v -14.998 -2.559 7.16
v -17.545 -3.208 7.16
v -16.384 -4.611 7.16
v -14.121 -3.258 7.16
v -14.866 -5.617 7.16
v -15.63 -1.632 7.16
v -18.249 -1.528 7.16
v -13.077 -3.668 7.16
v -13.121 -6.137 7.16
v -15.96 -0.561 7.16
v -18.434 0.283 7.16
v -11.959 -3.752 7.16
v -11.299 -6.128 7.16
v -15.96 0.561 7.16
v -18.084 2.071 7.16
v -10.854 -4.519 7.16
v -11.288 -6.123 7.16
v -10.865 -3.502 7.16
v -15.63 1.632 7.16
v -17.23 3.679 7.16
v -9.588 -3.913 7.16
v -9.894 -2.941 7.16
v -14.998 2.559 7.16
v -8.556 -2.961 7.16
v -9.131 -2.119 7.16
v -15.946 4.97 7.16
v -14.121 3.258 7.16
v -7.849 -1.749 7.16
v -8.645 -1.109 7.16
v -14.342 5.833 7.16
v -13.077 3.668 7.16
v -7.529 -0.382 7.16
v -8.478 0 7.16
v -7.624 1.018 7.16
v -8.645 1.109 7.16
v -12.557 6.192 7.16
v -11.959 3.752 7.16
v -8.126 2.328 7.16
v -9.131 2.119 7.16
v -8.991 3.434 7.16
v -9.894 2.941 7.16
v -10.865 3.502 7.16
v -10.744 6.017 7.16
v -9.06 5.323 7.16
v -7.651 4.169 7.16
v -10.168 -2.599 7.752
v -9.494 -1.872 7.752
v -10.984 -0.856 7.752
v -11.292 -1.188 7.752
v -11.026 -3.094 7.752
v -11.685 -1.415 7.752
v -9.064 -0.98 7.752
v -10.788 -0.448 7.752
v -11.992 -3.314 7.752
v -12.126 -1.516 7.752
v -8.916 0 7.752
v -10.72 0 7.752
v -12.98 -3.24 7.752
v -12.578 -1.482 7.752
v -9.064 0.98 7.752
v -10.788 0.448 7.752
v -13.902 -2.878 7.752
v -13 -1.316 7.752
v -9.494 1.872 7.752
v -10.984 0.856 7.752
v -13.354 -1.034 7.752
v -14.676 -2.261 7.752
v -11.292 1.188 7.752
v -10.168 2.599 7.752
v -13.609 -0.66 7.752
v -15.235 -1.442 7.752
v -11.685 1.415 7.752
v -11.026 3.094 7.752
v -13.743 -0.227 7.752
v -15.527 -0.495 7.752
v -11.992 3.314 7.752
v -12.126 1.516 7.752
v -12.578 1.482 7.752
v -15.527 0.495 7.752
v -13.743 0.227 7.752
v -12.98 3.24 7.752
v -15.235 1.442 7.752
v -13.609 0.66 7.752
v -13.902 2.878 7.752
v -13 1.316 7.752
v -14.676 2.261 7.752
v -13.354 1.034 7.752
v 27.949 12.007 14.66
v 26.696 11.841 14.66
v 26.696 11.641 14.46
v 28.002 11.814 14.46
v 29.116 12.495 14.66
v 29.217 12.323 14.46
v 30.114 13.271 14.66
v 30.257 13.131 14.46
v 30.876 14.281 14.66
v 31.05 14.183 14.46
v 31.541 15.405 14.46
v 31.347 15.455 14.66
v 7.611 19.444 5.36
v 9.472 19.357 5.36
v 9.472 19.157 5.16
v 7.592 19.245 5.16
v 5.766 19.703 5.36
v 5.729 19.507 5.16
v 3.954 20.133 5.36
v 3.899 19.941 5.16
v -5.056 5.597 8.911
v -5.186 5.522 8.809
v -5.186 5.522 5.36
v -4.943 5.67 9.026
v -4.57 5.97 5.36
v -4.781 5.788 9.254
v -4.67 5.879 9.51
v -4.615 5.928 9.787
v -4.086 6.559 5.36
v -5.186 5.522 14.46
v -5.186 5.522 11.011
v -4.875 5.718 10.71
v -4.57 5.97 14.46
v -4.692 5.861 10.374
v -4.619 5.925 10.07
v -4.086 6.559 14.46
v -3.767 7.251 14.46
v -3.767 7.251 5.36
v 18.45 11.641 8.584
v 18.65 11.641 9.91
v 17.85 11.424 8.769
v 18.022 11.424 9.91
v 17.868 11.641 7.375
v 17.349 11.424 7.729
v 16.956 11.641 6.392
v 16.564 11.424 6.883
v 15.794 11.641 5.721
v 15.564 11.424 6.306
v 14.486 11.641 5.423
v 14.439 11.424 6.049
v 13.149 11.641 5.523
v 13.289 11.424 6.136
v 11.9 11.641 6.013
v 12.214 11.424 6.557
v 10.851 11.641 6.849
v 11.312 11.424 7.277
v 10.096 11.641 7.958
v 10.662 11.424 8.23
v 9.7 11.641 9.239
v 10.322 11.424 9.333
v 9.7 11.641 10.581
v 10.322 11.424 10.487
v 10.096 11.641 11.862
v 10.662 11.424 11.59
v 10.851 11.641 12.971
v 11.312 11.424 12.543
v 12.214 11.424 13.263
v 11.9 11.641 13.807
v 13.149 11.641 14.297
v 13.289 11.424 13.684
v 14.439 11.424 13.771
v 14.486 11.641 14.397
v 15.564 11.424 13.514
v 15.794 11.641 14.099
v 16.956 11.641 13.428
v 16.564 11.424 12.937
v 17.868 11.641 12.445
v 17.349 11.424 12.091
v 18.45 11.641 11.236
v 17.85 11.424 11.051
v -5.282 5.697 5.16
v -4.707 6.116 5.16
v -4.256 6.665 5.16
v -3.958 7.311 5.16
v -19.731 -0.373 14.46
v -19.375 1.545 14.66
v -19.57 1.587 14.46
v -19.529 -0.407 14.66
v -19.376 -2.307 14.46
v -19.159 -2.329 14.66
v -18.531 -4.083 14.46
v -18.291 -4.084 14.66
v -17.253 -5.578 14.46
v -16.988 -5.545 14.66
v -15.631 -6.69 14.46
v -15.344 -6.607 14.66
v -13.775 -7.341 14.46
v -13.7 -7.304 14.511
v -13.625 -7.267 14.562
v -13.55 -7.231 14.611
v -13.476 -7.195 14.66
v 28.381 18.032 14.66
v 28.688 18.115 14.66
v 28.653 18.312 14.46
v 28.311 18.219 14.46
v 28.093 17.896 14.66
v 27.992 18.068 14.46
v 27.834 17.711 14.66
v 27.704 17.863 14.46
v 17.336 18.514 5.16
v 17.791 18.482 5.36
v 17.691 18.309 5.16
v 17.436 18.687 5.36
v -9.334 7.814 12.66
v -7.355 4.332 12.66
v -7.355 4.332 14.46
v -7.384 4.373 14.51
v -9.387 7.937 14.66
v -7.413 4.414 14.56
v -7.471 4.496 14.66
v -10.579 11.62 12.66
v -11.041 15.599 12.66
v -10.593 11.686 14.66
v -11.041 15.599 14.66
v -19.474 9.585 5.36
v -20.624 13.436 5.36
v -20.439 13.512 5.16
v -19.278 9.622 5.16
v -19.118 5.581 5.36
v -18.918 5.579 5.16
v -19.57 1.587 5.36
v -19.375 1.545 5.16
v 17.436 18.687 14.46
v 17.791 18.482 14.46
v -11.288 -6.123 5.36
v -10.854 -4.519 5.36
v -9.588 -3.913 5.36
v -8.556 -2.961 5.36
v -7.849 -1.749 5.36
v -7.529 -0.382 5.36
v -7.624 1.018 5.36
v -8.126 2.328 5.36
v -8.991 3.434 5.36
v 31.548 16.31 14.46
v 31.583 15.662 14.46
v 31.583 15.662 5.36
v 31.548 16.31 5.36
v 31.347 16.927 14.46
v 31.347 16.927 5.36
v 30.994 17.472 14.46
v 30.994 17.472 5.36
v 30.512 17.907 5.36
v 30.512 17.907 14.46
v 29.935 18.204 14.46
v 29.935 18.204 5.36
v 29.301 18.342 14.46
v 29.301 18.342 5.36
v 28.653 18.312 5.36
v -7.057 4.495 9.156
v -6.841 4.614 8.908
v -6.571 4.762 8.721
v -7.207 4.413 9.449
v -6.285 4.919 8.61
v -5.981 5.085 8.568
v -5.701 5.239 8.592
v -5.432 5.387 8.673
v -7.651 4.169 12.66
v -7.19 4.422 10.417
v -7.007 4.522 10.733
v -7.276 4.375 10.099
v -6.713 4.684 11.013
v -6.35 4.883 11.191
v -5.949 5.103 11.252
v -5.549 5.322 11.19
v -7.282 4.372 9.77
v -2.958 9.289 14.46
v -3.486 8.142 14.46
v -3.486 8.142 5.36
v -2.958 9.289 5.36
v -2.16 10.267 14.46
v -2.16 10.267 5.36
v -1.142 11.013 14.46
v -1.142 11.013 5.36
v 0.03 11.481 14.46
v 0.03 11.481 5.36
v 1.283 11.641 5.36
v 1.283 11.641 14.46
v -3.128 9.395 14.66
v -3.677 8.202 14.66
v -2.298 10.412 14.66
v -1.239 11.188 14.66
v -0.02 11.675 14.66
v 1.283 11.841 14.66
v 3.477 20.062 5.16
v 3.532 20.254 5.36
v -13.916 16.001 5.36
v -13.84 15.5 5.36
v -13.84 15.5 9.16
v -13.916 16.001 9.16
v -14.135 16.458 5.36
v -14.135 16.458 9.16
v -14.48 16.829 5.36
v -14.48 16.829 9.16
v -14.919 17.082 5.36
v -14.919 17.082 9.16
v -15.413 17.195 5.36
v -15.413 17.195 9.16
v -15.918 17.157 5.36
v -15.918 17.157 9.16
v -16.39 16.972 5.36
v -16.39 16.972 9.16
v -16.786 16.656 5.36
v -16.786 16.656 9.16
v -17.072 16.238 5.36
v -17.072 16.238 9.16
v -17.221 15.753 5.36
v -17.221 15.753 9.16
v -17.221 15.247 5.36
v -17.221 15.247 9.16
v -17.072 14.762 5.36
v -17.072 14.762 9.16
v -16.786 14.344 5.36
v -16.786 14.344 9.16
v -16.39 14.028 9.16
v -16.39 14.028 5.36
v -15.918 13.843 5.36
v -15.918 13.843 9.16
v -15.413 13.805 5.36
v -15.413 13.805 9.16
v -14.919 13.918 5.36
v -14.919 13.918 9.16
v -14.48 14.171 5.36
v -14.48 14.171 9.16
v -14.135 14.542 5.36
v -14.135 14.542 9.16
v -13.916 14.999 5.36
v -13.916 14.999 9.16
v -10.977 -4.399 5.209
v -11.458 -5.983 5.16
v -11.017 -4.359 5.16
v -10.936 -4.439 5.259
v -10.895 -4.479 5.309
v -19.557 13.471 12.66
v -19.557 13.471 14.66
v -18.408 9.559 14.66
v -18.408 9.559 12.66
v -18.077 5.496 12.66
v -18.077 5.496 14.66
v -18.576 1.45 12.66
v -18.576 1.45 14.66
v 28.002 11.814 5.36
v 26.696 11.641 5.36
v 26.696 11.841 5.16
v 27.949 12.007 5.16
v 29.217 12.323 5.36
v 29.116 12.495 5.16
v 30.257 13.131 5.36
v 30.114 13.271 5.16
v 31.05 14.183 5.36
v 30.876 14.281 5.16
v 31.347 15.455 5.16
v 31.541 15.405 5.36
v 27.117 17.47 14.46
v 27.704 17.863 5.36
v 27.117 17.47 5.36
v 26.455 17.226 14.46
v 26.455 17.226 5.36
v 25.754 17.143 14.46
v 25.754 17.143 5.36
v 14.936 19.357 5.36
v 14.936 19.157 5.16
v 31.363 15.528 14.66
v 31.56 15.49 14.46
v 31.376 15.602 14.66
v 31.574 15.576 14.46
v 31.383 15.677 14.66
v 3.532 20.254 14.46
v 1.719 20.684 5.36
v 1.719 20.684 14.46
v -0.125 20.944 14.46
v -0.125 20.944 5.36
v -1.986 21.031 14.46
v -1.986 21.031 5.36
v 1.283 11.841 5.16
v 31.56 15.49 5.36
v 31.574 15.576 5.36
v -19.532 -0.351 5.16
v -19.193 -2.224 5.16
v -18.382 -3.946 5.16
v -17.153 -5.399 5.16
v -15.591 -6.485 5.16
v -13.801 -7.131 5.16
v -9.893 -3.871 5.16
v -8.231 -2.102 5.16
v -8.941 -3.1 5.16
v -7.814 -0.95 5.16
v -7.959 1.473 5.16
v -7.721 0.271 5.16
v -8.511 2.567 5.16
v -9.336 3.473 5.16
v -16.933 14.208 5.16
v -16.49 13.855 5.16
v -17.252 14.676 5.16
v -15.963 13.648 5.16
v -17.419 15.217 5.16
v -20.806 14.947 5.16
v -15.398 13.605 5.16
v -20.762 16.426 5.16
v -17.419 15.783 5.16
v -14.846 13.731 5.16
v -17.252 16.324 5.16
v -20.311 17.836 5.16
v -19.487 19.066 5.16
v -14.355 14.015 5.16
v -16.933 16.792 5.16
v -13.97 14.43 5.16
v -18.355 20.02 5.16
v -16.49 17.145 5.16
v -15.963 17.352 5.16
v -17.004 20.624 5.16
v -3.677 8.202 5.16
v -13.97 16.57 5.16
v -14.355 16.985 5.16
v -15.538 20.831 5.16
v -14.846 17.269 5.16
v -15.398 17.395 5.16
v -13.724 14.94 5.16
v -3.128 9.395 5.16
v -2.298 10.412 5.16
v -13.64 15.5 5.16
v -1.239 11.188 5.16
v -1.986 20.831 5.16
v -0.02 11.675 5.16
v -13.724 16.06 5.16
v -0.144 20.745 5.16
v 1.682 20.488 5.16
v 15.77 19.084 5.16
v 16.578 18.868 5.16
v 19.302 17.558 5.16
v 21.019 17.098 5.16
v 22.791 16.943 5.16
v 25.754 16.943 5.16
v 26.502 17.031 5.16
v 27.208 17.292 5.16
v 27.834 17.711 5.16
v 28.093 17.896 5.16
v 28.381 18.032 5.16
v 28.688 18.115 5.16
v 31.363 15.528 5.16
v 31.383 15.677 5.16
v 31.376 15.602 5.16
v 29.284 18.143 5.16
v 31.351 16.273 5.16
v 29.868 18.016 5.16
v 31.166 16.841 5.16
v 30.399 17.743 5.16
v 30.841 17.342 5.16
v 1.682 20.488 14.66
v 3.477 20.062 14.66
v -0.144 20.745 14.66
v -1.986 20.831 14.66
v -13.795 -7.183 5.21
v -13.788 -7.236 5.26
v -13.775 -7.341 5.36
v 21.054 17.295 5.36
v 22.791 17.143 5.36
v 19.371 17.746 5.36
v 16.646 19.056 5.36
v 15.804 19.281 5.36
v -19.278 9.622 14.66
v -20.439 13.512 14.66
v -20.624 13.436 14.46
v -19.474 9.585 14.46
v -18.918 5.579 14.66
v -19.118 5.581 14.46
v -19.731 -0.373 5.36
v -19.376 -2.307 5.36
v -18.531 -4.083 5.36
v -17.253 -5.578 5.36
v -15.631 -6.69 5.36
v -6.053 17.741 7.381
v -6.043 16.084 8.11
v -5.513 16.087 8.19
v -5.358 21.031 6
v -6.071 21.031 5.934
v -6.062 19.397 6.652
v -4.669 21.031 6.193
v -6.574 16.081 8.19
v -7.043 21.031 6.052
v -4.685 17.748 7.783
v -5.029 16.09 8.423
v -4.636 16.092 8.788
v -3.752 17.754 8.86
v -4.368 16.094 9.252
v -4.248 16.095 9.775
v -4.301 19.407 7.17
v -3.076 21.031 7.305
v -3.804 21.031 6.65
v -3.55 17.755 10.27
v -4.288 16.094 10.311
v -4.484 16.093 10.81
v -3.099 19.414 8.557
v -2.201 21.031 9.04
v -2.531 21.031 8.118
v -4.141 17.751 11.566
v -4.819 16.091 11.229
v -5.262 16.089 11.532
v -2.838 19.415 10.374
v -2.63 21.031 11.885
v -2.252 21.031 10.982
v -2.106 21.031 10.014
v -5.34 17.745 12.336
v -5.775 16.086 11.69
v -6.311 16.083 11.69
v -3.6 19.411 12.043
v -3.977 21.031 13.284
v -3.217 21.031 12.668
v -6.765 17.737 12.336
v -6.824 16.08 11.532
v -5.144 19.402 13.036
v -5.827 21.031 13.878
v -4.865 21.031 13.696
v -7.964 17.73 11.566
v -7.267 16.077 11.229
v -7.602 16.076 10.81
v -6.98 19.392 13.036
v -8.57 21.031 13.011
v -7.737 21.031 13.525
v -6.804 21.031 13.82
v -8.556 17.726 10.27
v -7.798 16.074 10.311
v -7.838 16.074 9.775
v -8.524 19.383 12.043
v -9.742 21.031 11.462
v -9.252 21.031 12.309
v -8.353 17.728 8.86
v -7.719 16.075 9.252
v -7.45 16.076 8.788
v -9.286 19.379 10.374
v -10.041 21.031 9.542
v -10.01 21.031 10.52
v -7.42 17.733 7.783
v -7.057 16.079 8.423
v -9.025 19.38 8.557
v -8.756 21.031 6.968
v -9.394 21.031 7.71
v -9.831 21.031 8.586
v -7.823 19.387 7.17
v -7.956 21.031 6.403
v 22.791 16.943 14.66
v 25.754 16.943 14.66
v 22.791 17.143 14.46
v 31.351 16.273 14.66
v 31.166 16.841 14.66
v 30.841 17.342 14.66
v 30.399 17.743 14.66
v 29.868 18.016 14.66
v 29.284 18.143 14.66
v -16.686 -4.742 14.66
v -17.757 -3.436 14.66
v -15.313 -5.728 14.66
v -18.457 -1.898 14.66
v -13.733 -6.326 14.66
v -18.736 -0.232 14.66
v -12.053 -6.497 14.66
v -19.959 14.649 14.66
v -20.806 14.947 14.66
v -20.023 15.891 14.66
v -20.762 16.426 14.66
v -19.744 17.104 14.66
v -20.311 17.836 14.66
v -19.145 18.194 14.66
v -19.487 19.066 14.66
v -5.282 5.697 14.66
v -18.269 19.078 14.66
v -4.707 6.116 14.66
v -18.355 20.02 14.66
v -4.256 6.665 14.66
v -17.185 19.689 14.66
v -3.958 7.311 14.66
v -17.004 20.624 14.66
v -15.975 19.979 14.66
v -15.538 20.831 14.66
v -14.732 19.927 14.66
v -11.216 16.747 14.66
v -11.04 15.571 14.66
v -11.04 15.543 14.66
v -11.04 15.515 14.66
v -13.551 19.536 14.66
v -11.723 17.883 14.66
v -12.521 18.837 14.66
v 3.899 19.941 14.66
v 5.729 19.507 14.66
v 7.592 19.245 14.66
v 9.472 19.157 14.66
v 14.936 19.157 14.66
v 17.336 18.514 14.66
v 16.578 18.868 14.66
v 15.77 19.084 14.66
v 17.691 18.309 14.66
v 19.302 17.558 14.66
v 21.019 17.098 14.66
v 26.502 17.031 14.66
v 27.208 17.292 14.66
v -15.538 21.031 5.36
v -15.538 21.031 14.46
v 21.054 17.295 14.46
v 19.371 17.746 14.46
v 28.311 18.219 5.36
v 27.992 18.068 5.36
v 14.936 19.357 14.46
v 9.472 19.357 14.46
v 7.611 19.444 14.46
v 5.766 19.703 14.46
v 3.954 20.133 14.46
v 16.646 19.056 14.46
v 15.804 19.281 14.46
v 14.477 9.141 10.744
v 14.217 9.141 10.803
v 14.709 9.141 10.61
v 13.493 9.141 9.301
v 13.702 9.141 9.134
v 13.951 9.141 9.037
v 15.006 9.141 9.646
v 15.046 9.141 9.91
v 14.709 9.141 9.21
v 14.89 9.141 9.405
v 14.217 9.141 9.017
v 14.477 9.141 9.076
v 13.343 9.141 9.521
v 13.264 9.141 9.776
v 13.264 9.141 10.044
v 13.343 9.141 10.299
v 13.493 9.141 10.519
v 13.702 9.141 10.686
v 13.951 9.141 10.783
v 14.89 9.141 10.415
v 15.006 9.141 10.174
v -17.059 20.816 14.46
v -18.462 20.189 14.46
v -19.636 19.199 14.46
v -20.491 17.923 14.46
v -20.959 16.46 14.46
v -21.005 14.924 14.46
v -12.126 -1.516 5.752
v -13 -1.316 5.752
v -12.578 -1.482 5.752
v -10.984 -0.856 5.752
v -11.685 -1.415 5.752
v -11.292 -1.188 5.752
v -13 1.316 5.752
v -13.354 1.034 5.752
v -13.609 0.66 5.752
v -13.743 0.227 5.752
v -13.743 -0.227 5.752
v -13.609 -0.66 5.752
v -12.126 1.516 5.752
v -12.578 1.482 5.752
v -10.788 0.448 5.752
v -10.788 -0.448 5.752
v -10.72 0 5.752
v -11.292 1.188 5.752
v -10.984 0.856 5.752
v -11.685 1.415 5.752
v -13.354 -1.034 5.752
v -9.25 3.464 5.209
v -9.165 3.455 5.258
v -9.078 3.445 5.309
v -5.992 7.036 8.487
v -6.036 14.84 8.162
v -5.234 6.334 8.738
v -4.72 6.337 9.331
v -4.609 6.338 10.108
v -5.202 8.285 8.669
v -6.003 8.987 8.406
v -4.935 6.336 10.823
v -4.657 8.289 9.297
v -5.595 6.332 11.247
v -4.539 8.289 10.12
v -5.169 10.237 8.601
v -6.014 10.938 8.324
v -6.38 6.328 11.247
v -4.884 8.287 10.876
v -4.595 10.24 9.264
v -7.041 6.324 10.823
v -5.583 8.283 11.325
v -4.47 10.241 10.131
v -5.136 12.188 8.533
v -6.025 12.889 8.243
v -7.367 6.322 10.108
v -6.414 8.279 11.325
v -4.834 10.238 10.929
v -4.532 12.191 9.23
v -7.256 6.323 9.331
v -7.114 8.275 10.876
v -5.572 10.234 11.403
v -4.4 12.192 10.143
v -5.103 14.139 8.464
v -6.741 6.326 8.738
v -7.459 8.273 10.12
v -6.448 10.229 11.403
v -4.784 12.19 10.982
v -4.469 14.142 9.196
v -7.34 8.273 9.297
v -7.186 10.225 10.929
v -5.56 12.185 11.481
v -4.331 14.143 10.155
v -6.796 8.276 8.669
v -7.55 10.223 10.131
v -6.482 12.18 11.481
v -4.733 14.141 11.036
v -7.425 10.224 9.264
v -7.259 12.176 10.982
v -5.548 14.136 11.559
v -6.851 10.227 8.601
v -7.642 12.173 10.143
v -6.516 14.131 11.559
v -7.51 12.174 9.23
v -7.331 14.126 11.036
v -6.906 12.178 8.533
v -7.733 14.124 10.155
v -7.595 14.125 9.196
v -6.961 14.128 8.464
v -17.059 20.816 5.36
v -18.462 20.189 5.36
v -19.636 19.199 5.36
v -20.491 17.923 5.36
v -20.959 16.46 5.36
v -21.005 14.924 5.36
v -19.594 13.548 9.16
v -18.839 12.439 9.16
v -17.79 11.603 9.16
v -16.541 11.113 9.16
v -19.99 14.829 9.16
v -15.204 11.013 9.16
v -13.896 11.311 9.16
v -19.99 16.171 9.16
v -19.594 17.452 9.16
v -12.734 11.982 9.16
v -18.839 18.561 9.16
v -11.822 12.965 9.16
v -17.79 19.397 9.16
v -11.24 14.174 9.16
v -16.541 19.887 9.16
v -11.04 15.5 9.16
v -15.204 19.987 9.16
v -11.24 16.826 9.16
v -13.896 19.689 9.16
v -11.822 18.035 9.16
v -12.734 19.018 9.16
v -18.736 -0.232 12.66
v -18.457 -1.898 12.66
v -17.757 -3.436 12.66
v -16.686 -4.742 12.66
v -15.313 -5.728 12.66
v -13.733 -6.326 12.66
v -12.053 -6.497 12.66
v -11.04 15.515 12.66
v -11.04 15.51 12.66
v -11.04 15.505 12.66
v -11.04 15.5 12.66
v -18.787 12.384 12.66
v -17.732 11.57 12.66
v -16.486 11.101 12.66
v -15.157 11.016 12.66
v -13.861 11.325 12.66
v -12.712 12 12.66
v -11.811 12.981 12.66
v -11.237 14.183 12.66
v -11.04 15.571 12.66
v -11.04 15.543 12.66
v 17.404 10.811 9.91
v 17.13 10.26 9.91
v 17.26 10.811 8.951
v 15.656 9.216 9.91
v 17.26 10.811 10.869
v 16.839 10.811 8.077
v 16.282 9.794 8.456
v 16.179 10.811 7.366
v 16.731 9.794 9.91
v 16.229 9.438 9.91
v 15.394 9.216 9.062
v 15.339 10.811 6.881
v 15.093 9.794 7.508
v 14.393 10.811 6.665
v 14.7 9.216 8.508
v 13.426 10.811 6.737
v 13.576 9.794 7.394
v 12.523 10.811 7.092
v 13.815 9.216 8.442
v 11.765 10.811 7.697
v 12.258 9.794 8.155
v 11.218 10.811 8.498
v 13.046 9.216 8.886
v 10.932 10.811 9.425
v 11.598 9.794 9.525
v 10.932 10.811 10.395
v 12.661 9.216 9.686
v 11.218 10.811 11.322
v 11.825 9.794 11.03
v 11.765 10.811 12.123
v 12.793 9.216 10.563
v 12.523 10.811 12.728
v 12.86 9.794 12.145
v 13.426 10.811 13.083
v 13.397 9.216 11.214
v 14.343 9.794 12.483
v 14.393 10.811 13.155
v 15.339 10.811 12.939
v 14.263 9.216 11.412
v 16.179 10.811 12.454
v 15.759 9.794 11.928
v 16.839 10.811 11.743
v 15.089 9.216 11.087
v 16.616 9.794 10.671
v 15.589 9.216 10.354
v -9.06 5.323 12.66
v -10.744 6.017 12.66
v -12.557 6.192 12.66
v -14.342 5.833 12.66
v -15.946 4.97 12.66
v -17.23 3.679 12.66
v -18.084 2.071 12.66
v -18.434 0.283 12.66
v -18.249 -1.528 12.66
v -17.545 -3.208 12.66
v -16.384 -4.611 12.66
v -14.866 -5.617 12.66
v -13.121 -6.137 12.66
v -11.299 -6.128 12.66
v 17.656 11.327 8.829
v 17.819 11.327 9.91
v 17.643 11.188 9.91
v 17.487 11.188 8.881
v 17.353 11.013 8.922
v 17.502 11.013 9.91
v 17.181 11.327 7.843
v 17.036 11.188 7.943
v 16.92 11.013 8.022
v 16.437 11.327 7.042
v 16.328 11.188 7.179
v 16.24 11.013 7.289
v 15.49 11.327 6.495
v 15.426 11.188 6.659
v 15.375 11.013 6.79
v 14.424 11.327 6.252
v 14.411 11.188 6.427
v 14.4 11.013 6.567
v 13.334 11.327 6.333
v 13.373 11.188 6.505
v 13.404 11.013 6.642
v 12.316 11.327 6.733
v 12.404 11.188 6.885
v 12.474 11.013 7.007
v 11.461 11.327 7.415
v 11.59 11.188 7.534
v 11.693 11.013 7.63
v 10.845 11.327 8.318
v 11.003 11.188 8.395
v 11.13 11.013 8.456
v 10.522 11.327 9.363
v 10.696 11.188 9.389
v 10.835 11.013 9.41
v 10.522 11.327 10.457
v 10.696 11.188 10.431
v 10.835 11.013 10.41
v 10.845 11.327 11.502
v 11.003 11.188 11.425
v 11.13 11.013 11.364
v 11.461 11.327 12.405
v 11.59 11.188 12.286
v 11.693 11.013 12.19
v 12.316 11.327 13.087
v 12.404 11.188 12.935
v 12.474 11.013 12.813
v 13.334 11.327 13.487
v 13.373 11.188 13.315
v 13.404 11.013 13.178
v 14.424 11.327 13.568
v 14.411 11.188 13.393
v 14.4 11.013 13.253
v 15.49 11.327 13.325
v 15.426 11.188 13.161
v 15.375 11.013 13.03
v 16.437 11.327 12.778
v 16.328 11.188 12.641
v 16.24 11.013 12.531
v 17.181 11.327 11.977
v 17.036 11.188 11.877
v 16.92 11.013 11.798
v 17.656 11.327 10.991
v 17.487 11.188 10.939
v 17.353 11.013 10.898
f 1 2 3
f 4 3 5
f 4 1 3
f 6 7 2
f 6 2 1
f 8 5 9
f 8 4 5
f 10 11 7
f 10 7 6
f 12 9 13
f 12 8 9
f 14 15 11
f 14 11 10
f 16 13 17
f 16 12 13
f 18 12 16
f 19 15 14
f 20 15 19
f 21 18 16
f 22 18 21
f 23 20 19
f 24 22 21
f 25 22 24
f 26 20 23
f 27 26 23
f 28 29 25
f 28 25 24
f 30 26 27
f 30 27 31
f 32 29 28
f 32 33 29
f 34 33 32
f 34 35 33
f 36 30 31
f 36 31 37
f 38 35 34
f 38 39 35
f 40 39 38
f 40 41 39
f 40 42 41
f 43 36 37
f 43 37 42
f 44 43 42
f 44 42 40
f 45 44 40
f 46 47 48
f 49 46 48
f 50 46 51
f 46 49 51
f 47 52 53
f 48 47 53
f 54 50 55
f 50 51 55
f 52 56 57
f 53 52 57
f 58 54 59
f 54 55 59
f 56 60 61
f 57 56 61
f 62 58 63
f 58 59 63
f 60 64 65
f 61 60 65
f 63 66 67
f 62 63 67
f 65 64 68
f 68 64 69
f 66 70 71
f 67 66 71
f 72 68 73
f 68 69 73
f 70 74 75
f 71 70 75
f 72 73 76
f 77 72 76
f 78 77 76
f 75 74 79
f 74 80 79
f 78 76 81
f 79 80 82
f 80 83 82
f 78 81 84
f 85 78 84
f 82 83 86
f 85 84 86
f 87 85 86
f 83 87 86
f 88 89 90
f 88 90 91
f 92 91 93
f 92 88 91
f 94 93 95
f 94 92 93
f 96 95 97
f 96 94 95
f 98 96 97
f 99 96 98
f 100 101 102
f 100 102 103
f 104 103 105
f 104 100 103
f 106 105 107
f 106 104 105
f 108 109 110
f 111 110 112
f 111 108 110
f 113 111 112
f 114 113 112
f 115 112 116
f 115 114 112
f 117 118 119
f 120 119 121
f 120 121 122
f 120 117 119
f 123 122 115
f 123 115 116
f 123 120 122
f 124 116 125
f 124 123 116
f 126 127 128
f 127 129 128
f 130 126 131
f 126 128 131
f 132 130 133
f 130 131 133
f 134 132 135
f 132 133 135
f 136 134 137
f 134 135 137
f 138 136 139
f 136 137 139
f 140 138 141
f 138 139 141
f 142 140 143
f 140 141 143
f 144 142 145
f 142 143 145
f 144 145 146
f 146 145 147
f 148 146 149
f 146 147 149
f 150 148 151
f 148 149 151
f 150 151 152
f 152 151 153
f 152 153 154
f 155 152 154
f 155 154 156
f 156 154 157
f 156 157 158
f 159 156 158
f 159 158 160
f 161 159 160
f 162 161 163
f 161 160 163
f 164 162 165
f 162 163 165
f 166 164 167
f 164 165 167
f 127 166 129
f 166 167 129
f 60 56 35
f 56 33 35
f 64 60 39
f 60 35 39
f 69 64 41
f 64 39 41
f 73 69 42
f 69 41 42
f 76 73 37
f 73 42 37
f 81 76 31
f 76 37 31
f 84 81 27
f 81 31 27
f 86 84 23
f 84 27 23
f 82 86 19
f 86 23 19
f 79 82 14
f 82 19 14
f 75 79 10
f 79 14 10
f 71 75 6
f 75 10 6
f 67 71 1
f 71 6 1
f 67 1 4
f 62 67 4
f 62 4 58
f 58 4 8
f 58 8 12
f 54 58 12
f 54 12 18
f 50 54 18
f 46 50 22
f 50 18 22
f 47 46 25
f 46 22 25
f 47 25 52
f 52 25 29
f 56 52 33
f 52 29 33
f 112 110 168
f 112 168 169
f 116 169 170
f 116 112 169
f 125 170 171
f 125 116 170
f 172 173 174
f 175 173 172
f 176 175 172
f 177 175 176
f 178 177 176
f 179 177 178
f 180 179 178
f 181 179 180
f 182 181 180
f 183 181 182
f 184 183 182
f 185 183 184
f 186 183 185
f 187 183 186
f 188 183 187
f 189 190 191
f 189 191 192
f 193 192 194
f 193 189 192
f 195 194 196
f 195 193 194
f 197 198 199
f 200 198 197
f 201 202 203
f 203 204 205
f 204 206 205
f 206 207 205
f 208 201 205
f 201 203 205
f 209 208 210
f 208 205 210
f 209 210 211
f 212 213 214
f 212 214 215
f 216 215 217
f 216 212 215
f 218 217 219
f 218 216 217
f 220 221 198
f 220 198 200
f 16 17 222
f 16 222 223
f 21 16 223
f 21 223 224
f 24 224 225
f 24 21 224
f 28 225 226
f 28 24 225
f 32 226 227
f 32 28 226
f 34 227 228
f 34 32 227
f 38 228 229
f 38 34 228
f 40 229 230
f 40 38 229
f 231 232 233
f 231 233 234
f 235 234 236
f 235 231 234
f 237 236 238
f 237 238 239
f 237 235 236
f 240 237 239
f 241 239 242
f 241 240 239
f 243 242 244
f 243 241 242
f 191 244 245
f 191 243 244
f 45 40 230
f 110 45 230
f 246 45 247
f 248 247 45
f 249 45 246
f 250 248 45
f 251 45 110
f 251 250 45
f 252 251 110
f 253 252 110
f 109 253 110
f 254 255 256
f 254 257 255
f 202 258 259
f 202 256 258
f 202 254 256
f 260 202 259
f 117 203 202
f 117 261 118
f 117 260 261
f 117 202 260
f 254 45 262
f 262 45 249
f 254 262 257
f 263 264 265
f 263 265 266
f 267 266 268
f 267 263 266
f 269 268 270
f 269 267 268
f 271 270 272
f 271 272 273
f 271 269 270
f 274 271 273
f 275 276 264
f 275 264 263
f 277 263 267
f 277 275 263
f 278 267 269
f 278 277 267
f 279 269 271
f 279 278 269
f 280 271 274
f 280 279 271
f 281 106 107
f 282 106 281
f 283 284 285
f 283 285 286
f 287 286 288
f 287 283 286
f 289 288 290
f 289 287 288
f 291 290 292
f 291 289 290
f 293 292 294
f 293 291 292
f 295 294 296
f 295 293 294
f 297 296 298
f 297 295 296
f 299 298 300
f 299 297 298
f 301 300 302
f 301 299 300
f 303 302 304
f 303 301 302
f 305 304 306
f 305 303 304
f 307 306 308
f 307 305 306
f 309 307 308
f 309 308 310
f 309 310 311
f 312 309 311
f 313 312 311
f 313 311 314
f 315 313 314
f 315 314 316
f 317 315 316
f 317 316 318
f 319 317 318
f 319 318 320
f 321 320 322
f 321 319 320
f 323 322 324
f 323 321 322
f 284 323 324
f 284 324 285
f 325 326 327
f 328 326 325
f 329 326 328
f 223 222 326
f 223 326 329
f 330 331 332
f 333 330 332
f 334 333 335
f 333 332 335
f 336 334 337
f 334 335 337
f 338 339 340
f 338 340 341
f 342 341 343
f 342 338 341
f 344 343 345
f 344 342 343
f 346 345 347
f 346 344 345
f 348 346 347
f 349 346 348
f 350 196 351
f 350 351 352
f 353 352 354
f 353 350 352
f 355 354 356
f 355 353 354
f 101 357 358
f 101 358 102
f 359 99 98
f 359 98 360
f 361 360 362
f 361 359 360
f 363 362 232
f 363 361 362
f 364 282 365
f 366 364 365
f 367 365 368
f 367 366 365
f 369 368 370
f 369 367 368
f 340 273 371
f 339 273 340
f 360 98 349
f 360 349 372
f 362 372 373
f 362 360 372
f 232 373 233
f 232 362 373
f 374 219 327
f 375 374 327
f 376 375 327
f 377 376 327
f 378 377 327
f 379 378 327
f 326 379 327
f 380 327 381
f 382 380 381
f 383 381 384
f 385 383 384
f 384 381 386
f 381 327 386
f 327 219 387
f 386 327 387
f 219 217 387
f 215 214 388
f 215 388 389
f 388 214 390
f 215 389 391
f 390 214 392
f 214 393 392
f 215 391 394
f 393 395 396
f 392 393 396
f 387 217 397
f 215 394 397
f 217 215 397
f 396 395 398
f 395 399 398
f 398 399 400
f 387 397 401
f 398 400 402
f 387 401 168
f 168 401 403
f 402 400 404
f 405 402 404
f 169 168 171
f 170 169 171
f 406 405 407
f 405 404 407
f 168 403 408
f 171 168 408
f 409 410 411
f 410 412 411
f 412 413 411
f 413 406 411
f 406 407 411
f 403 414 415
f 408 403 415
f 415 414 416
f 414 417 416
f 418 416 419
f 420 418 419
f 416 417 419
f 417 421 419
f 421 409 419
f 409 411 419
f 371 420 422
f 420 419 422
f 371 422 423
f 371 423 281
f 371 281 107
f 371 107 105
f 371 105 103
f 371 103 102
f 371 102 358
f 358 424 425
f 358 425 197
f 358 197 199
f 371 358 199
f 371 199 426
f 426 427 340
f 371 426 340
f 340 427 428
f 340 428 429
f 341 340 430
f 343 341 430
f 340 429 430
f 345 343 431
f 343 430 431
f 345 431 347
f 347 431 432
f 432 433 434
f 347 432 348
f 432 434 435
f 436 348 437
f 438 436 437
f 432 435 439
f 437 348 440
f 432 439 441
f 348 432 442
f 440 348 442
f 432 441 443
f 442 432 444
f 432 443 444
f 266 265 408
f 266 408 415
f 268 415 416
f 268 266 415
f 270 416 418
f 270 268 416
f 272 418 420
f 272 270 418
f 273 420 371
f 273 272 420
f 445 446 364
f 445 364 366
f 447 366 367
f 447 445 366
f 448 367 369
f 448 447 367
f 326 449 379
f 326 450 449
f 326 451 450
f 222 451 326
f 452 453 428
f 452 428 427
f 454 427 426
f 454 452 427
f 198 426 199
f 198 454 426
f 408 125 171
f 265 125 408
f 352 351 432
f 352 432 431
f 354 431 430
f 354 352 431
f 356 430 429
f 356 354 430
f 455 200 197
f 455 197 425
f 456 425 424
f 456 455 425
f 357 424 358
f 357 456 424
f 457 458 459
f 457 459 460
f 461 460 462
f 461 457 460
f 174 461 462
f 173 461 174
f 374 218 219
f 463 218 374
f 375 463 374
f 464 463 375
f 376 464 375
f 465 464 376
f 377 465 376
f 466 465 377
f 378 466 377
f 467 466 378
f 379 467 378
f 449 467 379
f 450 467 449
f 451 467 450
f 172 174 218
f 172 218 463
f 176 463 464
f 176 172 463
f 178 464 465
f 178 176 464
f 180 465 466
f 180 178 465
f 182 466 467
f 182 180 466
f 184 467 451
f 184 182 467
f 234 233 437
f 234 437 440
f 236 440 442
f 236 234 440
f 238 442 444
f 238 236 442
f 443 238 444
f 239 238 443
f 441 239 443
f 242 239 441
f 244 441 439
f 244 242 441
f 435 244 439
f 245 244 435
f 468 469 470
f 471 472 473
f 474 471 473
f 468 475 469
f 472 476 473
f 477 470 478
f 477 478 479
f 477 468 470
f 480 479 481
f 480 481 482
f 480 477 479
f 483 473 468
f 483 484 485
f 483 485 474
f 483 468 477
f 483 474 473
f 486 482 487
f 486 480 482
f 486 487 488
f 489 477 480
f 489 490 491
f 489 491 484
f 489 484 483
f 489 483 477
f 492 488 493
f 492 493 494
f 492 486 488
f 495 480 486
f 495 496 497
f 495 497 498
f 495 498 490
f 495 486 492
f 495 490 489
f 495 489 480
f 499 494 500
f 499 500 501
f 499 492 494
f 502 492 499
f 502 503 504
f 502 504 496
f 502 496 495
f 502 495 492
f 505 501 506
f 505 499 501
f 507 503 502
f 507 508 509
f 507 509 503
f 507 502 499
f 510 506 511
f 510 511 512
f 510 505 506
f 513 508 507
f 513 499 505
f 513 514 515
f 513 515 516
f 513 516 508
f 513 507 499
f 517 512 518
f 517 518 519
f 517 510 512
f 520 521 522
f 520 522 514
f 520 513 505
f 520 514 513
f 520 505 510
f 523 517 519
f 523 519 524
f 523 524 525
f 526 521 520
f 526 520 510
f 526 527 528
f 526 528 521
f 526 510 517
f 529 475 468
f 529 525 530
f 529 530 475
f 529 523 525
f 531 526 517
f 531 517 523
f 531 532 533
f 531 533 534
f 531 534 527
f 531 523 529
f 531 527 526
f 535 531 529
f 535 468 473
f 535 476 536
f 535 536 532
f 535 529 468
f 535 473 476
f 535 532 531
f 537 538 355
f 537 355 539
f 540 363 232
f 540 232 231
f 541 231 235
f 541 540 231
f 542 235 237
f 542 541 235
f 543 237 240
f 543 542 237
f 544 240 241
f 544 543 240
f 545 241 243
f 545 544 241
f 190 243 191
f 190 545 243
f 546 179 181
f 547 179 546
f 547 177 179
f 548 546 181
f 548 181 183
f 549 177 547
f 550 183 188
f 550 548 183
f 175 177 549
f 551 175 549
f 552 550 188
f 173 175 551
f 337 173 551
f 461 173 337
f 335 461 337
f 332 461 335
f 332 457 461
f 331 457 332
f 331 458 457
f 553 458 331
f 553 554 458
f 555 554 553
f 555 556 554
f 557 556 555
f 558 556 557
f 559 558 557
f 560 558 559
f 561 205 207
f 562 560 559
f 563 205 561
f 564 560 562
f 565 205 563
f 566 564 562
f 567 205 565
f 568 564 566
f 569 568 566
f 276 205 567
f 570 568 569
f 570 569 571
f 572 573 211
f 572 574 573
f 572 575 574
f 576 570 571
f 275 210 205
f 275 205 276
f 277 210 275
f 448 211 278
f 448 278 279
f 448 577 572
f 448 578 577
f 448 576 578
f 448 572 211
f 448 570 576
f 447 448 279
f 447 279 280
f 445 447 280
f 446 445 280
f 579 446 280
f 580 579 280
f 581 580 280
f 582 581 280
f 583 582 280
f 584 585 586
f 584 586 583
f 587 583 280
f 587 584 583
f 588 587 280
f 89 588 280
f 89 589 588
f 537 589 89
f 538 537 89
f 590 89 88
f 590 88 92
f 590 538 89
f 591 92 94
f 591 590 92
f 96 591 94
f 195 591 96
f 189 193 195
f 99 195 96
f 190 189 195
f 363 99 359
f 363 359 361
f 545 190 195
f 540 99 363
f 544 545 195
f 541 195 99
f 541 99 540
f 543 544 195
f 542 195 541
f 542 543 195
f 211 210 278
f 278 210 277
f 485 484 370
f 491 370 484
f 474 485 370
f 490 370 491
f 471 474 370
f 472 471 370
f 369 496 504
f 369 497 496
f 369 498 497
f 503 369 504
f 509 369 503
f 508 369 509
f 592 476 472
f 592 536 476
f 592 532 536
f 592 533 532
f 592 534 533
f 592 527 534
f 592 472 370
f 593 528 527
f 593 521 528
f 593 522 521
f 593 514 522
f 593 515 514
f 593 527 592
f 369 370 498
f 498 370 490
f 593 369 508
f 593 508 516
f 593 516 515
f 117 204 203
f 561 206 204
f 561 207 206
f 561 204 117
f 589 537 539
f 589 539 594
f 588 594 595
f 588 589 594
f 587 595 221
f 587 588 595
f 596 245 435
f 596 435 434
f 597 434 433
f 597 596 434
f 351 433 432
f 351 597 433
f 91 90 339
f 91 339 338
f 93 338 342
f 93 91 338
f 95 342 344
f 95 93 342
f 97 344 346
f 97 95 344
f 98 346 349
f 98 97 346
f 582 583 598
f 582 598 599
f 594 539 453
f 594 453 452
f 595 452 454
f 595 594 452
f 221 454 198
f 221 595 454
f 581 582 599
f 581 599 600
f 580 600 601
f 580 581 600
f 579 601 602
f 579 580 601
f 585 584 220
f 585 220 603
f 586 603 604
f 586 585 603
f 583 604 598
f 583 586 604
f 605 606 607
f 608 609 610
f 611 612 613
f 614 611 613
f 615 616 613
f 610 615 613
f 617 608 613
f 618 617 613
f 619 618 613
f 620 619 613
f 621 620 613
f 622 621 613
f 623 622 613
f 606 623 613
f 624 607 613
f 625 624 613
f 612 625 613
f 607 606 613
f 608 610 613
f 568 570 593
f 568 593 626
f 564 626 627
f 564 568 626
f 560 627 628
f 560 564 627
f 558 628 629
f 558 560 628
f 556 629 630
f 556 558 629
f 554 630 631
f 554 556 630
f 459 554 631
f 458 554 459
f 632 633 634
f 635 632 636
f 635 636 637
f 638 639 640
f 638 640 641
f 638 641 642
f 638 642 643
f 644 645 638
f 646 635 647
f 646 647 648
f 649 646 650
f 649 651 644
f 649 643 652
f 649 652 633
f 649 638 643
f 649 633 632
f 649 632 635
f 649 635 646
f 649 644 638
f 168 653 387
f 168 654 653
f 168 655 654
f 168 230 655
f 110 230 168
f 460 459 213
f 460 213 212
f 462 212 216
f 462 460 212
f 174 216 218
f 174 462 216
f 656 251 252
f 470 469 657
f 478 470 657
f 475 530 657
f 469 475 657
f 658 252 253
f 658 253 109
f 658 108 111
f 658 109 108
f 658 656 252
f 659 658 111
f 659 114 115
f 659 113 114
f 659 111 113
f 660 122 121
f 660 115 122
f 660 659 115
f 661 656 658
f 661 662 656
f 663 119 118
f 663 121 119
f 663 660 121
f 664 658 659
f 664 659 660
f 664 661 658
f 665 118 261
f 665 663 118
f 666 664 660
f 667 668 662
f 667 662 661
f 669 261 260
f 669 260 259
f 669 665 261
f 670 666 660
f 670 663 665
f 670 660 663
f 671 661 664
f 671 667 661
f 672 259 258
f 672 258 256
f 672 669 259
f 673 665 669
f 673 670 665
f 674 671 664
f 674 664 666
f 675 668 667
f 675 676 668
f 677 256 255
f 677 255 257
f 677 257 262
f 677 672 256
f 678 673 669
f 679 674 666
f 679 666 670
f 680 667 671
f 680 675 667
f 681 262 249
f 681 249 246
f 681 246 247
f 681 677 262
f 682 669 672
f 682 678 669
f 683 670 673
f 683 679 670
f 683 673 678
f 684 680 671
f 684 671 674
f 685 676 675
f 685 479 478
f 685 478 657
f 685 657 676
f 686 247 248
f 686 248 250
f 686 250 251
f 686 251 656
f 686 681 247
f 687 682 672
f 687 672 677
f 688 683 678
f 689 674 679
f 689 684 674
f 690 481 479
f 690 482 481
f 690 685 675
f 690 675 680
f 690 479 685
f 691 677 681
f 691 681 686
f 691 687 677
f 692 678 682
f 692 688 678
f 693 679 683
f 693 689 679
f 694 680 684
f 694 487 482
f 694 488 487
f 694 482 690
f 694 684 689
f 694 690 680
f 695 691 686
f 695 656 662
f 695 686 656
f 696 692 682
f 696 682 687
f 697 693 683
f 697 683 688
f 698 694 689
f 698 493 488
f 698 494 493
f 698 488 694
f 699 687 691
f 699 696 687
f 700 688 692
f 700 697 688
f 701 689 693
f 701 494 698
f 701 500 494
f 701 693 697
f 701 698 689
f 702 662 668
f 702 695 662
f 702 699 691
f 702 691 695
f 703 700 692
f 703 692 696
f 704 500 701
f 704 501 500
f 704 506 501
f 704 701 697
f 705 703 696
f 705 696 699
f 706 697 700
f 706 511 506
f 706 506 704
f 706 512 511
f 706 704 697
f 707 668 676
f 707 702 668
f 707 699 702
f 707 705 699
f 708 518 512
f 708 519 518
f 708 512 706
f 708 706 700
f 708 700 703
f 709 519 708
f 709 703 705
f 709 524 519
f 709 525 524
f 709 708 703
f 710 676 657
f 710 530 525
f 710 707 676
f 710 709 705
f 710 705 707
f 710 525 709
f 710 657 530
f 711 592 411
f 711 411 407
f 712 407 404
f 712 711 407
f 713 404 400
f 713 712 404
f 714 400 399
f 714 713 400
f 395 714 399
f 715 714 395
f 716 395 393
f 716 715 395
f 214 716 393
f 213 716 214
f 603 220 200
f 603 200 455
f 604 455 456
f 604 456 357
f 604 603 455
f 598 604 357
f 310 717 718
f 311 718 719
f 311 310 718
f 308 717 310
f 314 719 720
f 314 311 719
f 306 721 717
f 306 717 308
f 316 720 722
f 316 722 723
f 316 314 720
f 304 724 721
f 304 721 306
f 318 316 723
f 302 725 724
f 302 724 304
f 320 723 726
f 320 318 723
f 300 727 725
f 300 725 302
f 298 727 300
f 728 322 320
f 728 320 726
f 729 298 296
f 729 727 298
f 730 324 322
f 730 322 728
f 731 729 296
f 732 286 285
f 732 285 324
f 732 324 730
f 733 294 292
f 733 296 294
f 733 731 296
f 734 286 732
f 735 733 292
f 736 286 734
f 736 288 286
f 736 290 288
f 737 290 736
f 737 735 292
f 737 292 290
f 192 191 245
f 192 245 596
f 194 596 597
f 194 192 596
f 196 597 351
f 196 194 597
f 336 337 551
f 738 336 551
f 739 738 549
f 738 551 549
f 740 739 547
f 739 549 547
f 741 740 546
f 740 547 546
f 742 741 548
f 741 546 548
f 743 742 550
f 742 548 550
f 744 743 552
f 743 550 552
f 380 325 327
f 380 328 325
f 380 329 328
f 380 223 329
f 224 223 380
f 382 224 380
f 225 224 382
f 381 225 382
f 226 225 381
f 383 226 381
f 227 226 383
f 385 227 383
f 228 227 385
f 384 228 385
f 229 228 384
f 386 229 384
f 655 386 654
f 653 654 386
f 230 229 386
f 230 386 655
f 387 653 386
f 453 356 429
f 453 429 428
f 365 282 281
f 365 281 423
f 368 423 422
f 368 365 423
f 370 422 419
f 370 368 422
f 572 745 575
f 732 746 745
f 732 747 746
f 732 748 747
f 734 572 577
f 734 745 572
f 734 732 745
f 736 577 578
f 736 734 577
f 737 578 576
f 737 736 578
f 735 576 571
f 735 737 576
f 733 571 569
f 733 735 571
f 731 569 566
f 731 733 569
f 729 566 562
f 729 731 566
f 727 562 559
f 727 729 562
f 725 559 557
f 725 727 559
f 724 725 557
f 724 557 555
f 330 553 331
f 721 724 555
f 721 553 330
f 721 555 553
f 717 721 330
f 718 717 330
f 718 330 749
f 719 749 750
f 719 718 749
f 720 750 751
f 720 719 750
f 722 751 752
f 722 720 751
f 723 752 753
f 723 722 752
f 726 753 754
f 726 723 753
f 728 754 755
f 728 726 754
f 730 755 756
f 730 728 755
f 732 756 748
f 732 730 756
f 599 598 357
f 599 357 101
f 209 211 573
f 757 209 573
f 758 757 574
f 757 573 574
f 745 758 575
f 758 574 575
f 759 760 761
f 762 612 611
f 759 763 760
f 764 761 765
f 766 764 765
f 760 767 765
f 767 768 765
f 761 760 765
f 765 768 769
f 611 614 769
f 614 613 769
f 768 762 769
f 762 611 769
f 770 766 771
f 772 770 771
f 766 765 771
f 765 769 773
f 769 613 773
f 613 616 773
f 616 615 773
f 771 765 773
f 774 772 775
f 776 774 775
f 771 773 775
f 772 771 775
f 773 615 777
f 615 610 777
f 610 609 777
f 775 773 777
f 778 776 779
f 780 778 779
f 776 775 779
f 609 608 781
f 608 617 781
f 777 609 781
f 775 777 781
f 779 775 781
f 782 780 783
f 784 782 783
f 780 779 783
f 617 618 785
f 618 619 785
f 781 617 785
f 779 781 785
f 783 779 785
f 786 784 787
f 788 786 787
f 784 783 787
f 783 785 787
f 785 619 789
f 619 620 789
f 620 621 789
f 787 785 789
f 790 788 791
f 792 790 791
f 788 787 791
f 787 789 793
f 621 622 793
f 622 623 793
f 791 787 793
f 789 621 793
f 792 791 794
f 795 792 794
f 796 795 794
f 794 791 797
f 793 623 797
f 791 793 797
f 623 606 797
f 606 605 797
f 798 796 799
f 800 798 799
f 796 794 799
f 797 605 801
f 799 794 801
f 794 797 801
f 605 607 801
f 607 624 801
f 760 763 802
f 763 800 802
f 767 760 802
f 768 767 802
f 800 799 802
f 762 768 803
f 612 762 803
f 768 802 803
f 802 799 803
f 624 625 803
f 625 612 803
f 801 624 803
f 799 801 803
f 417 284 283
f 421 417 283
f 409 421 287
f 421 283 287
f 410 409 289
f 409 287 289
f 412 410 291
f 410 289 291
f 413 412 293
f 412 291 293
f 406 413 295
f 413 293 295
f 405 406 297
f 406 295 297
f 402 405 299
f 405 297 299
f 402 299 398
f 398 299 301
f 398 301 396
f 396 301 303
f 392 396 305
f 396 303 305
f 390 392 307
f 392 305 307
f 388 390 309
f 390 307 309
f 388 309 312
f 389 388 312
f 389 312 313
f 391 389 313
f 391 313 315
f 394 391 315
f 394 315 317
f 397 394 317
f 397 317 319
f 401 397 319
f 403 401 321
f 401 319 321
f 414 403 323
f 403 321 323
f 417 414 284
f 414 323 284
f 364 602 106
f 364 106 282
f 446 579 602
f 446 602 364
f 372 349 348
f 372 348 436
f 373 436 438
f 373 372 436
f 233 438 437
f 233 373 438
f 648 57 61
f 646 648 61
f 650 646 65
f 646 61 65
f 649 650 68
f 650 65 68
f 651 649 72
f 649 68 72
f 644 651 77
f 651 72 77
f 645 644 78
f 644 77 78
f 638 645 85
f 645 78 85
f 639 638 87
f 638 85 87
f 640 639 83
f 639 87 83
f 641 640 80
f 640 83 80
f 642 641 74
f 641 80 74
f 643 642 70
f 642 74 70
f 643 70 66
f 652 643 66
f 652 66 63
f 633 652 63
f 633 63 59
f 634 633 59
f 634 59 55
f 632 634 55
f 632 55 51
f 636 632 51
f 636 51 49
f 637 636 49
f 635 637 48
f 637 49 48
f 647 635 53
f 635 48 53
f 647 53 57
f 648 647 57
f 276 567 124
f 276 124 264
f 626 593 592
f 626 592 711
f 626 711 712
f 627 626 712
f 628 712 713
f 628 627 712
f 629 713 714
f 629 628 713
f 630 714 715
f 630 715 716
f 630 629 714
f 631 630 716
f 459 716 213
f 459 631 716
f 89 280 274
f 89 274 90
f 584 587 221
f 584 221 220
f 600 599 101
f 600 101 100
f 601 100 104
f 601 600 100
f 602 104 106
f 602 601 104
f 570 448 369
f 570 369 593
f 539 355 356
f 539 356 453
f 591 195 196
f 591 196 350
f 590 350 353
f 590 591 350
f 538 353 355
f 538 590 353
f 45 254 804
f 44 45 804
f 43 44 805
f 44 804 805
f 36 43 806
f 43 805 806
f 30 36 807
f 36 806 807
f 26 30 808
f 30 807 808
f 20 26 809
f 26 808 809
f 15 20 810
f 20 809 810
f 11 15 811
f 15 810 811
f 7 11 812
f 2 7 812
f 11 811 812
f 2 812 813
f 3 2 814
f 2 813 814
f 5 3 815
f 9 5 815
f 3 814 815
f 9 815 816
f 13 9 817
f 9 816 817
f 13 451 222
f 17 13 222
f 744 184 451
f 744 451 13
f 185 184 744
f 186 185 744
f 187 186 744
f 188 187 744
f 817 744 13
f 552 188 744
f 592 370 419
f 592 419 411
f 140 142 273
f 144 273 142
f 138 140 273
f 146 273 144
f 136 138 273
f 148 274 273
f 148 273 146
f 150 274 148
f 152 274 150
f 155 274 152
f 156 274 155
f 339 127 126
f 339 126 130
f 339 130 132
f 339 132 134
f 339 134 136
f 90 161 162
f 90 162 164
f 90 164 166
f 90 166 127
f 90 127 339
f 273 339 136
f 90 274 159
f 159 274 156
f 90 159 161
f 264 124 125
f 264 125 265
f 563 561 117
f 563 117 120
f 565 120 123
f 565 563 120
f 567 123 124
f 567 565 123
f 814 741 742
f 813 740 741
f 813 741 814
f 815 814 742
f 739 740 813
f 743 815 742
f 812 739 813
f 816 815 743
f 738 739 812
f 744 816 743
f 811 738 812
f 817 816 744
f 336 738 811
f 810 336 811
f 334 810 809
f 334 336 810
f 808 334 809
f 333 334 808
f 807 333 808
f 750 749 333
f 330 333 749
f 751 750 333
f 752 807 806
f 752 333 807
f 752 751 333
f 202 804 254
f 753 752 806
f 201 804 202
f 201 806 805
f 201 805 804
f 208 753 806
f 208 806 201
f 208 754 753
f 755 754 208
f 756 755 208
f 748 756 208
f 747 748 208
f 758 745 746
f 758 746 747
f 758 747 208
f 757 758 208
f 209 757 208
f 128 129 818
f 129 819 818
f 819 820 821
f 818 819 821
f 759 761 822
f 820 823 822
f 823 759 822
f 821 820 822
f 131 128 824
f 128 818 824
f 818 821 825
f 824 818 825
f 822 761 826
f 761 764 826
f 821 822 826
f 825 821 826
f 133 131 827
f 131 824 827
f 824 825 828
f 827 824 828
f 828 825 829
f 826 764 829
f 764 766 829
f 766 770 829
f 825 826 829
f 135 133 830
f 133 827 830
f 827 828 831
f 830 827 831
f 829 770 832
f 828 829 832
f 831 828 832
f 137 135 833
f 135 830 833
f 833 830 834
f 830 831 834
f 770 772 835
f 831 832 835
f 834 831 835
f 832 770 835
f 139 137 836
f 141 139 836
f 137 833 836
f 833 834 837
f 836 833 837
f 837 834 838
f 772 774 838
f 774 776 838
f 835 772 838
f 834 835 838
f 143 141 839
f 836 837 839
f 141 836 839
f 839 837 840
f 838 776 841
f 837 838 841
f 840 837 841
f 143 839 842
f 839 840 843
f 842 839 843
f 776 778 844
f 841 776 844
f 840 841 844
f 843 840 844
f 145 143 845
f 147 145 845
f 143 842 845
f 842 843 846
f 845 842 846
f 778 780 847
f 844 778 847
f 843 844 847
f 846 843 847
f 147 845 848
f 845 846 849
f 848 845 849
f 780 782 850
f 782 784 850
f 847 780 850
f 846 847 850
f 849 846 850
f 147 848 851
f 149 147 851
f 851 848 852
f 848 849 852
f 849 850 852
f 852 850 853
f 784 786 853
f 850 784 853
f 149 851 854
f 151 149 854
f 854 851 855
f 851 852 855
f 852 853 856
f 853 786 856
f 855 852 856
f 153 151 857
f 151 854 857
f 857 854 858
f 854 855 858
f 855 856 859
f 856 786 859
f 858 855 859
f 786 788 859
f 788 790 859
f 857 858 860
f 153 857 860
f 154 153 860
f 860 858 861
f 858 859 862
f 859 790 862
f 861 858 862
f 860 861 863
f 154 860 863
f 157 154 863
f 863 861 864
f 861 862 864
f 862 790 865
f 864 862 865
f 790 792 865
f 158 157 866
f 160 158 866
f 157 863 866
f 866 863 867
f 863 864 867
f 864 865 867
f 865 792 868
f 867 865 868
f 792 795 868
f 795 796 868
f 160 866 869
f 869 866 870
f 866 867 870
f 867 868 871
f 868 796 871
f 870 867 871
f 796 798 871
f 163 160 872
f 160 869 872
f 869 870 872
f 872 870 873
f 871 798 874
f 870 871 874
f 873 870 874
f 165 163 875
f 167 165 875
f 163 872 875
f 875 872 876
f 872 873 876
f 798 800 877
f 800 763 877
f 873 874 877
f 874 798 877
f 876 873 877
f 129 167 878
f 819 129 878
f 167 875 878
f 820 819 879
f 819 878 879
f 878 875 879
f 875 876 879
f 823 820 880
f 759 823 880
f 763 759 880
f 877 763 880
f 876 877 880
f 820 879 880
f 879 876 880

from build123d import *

# Parameters (mm, degrees)
EXTRUDE_1_DEPTH          = 9.5
CUT_EXTRUDE_1_DEPTH      = 2
CUT_EXTRUDE_2_DEPTH      = 5
CUT_EXTRUDE_2_DEPTH_BACK = 5
CHAMFER_3_SIZE           = 0.2
CHAMFER_4_SIZE           = 0.2
CHAMFER_5_SIZE           = 0.2
SKETCH_35_R              = 1.52
CUT_EXTRUDE_3_DEPTH      = 2


with BuildPart() as part:
    # 草图1 → 凸台-拉伸1 (new body)
    with BuildSketch(Plane.XY.offset(14.66)):
        with BuildLine():
            Line((10.013875018, 11.640660484), (26.695757592, 11.640660484))
            ThreePointArc((26.695757592, 11.640660484), (29.763542255, 12.692408053), (31.540712894, 15.405181579))
            ThreePointArc((31.540712894, 15.405181579), (31.567392591, 15.532704372), (31.582905999, 15.662061255))
            ThreePointArc((31.582905999, 15.662061255), (30.767257841, 17.705140503), (28.652721603, 18.311928133))
            ThreePointArc((28.652721603, 18.311928133), (28.148188919, 18.150812525), (27.70363757, 17.86291399))
            ThreePointArc((27.70363757, 17.86291399), (26.793087906, 17.328646623), (25.753839798, 17.142889571))
            Line((25.753839798, 17.142889571), (22.790573212, 17.142889571))
            ThreePointArc((22.790573212, 17.142889571), (20.202578582, 17.48357884), (17.790924351, 18.482432813))
            Line((17.790924351, 18.482432813), (17.43600444, 18.687326732))
            ThreePointArc((17.43600444, 18.687326732), (16.230177325, 19.186753718), (14.93618001, 19.357098353))
            Line((14.93618001, 19.357098353), (9.471737064, 19.357098353))
            ThreePointArc((9.471737064, 19.357098353), (6.685692146, 19.552100152), (3.953975606, 20.133302981))
            Line((3.953975606, 20.133302981), (3.531774948, 20.254486258))
            ThreePointArc((3.531774948, 20.254486258), (0.800058407, 20.835689087), (-1.985986511, 21.030690887))
            Line((-1.985986511, 21.030690887), (-15.538147248, 21.030690887))
            ThreePointArc((-15.538147248, 21.030690887), (-20.108103219, 18.591001725), (-20.623778443, 13.436328132))
            ThreePointArc((-20.623778443, 13.436328132), (-19.195597321, 7.592016854), (-19.570086215, 1.587399156))
            ThreePointArc((-19.570086215, 1.587399156), (-18.531135486, -4.083088818), (-13.775230647, -7.341189744))
            Line((-13.775230647, -7.341189744), (-11.288176227, -6.122720263))
            Line((-11.288176227, -6.122720263), (-10.853623376, -4.518995222))
            ThreePointArc((-10.853623376, -4.518995222), (-7.637616135, -1.077692314), (-8.991428746, 3.433677732))
            Line((-8.991428746, 3.433677732), (-5.185613362, 5.521767908))
            ThreePointArc((-5.185613362, 5.521767908), (-4.30923615, 6.249201579), (-3.767164175, 7.250877543))
            Line((-3.767164175, 7.250877543), (-3.486450124, 8.142372809))
            ThreePointArc((-3.486450124, 8.142372809), (-1.67460917, 10.672320293), (1.282707044, 11.640660484))
            Line((1.282707044, 11.640660484), (10.013875018, 11.640660484))
        make_face()
    extrude(amount=-EXTRUDE_1_DEPTH)

    # 草图2 → 切除-拉伸1 (cut)
    with BuildSketch(Plane.XY.offset(14.66)):
        with BuildLine():
            ThreePointArc((-18.576270357, 1.449716513), (-10.888967052, -6.358042936), (-7.040699486, 3.900932474))
            ThreePointArc((-7.040699486, 3.900932474), (-9.967136502, 9.432986631), (-11.040523791, 15.598657441))
            ThreePointArc((-11.040523791, 15.598657441), (-14.604669497, 11.128277968), (-19.678620032, 13.763131518))
            ThreePointArc((-19.678620032, 13.763131518), (-18.152154257, 7.693736239), (-18.576270357, 1.449716513))
        make_face()
    extrude(amount=-CUT_EXTRUDE_1_DEPTH, mode=Mode.SUBTRACT)

    # 草图7 → 切除-拉伸2 (cut, two sides: drawn at the far end of the back side and taken through both)
    with BuildSketch(Plane.XY.offset(12.16).offset(-CUT_EXTRUDE_2_DEPTH_BACK)):
        with BuildLine():
            Line((-11.093260582, -6.093027877), (-10.743074352, -4.770661757))
            ThreePointArc((-10.743074352, -4.770661757), (-7.437188108, -1.39032296), (-8.426086578, 3.233274564))
            ThreePointArc((-8.426086578, 3.233274564), (-7.84768541, 3.478159198), (-7.255220155, 3.686728888))
            ThreePointArc((-7.255220155, 3.686728888), (-18.011463654, 2.26499609), (-11.093260582, -6.093027877))
        make_face()
    extrude(amount=CUT_EXTRUDE_2_DEPTH + CUT_EXTRUDE_2_DEPTH_BACK, mode=Mode.SUBTRACT)

    # 草图20 → 切除-旋转1 (revolve, cut)
    with BuildSketch(Plane(origin=(0, 15.5, 0), x_dir=(1, 0, 0), z_dir=(0, 1, 0))):
        Polygon((-13.84, -5.16), (-15.54, -5.16), (-15.54, -14.66), (-11.04, -14.66), (-11.04, -9.16), (-13.84, -9.16), align=None)
    revolve(axis=Axis((-15.54, 15.5, 5.16), (0, 0, 1)), mode=Mode.SUBTRACT)

    # 草图28 → 旋转1 (revolve)
    with BuildSketch(Plane(origin=(0, 0, 9.91), x_dir=(-1, 0, 0), z_dir=(0, 0, -1))):
        with BuildLine():
            Line((-15.045898034, 9.140660484), (-14.15, 9.140660484))
            Line((-14.15, 9.140660484), (-14.15, 11.640660484))
            Line((-14.15, 11.640660484), (-18.65, 11.640660484))
            Line((-18.65, 11.640660484), (-18.021509962, 11.424042656))
            ThreePointArc((-18.021509962, 11.424042656), (-17.642565022, 11.188030722), (-17.404086822, 10.81063299))
            ThreePointArc((-17.404086822, 10.81063299), (-16.490704468, 9.600431485), (-15.045898034, 9.140660484))
        make_face()
    revolve(axis=Axis((14.15, 9.140660484, 9.91), (0, 1, 0)))

    # 草图31 → 旋转2 (revolve)
    with BuildSketch(Plane(origin=(0, 0, 0), x_dir=(1, 0, 0), z_dir=(0, 1, 0))):
        Polygon((-8.477724428, -7.16), (-12.24, -7.16), (-12.24, -7.751660878), (-10.2, -7.751660878), (-8.916332066, -7.751660878), align=None)
    revolve(axis=Axis((-12.24, 0, 7.16), (0, 0, 1)))

    # 草图34 → 切除-旋转2 (revolve, cut)
    with BuildSketch(Plane(origin=(-5.952118717, 0.015774741, 0), x_dir=(0, 0, -1), z_dir=(0.9999839503688693, 0.005665598350652085, 0))):
        Polygon((-9.91, 21.068889451), (-9.91, 4.068889451), (-8.61, 4.068889451), (-8.11, 16.068889451), (-5.91, 21.068889451), align=None)
    revolve(axis=Axis((-6.575334536, 110.014009282, 9.91), (0.005665598350652086, -0.9999839503688692, 0)), mode=Mode.SUBTRACT)

    # 倒角3
    chamfer_3_edges = [part.edges().sort_by_distance(p)[0] for p in [
        (31.567392591, 15.532704372, 5.16),
        (29.763542255, 12.692408053, 5.16),
        (30.767257841, 17.705140503, 5.16),
        (28.148188919, 18.150812525, 5.16),
        (26.793087906, 17.328646623, 5.16),
        (24.272206505, 17.142889571, 5.16),
        (20.202578582, 17.48357884, 5.16),
        (17.613464396, 18.584879772, 5.16),
        (16.230177325, 19.186753718, 5.16),
        (12.203958537, 19.357098353, 5.16),
        (6.685692146, 19.552100152, 5.16),
        (3.742875277, 20.19389462, 5.16),
        (0.800058407, 20.835689087, 5.16),
        (-8.762066879, 21.030690887, 5.16),
        (-20.108103219, 18.591001725, 5.16),
        (-19.195597321, 7.592016854, 5.16),
        (-18.531135486, -4.083088818, 5.16),
        (-12.531703437, -6.731955004, 5.16),
        (-11.070899801, -5.320857743, 5.16),
        (-7.637616135, -1.077692314, 5.16),
        (-7.088521054, 4.47772282, 5.16),
        (-4.30923615, 6.249201579, 5.16),
        (-3.626807149, 7.696625176, 5.16),
        (-1.67460917, 10.672320293, 5.16),
        (13.989232318, 11.640660484, 5.16),
    ]]
    chamfer(chamfer_3_edges, length=CHAMFER_3_SIZE)

    # 倒角4
    chamfer_4_edges = [part.edges().sort_by_distance(p)[0] for p in [
        (-17.24, 15.5, 5.16),
    ]]
    chamfer(chamfer_4_edges, length=CHAMFER_4_SIZE)

    # 倒角5
    chamfer_5_edges = [part.edges().sort_by_distance(p)[0] for p in [
        (-18.531135486, -4.083088818, 14.66),
        (-19.195597321, 7.592016854, 14.66),
        (-20.108103219, 18.591001725, 14.66),
        (-8.762066879, 21.030690887, 14.66),
        (0.800058407, 20.835689087, 14.66),
        (3.742875277, 20.19389462, 14.66),
        (6.685692146, 19.552100152, 14.66),
        (12.203958537, 19.357098353, 14.66),
        (16.230177325, 19.186753718, 14.66),
        (17.613464396, 18.584879772, 14.66),
        (20.202578582, 17.48357884, 14.66),
        (24.272206505, 17.142889571, 14.66),
        (26.793087906, 17.328646623, 14.66),
        (28.148188919, 18.150812525, 14.66),
        (30.767257841, 17.705140503, 14.66),
        (31.567392591, 15.532704372, 14.66),
        (29.763542255, 12.692408053, 14.66),
        (13.989232318, 11.640660484, 14.66),
        (-1.67460917, 10.672320293, 14.66),
        (-3.626807149, 7.696625176, 14.66),
        (-4.30923615, 6.249201579, 14.66),
        (-6.270263103, 4.926666401, 14.66),
    ]]
    chamfer(chamfer_5_edges, length=CHAMFER_5_SIZE)

    # 草图35 → 切除-拉伸3 (cut)
    with BuildSketch(Plane.XY.offset(7.751660878)):
        with Locations((-12.24, 0)):
            Circle(SKETCH_35_R)
    extrude(amount=-CUT_EXTRUDE_3_DEPTH, mode=Mode.SUBTRACT)


solid = part.part
